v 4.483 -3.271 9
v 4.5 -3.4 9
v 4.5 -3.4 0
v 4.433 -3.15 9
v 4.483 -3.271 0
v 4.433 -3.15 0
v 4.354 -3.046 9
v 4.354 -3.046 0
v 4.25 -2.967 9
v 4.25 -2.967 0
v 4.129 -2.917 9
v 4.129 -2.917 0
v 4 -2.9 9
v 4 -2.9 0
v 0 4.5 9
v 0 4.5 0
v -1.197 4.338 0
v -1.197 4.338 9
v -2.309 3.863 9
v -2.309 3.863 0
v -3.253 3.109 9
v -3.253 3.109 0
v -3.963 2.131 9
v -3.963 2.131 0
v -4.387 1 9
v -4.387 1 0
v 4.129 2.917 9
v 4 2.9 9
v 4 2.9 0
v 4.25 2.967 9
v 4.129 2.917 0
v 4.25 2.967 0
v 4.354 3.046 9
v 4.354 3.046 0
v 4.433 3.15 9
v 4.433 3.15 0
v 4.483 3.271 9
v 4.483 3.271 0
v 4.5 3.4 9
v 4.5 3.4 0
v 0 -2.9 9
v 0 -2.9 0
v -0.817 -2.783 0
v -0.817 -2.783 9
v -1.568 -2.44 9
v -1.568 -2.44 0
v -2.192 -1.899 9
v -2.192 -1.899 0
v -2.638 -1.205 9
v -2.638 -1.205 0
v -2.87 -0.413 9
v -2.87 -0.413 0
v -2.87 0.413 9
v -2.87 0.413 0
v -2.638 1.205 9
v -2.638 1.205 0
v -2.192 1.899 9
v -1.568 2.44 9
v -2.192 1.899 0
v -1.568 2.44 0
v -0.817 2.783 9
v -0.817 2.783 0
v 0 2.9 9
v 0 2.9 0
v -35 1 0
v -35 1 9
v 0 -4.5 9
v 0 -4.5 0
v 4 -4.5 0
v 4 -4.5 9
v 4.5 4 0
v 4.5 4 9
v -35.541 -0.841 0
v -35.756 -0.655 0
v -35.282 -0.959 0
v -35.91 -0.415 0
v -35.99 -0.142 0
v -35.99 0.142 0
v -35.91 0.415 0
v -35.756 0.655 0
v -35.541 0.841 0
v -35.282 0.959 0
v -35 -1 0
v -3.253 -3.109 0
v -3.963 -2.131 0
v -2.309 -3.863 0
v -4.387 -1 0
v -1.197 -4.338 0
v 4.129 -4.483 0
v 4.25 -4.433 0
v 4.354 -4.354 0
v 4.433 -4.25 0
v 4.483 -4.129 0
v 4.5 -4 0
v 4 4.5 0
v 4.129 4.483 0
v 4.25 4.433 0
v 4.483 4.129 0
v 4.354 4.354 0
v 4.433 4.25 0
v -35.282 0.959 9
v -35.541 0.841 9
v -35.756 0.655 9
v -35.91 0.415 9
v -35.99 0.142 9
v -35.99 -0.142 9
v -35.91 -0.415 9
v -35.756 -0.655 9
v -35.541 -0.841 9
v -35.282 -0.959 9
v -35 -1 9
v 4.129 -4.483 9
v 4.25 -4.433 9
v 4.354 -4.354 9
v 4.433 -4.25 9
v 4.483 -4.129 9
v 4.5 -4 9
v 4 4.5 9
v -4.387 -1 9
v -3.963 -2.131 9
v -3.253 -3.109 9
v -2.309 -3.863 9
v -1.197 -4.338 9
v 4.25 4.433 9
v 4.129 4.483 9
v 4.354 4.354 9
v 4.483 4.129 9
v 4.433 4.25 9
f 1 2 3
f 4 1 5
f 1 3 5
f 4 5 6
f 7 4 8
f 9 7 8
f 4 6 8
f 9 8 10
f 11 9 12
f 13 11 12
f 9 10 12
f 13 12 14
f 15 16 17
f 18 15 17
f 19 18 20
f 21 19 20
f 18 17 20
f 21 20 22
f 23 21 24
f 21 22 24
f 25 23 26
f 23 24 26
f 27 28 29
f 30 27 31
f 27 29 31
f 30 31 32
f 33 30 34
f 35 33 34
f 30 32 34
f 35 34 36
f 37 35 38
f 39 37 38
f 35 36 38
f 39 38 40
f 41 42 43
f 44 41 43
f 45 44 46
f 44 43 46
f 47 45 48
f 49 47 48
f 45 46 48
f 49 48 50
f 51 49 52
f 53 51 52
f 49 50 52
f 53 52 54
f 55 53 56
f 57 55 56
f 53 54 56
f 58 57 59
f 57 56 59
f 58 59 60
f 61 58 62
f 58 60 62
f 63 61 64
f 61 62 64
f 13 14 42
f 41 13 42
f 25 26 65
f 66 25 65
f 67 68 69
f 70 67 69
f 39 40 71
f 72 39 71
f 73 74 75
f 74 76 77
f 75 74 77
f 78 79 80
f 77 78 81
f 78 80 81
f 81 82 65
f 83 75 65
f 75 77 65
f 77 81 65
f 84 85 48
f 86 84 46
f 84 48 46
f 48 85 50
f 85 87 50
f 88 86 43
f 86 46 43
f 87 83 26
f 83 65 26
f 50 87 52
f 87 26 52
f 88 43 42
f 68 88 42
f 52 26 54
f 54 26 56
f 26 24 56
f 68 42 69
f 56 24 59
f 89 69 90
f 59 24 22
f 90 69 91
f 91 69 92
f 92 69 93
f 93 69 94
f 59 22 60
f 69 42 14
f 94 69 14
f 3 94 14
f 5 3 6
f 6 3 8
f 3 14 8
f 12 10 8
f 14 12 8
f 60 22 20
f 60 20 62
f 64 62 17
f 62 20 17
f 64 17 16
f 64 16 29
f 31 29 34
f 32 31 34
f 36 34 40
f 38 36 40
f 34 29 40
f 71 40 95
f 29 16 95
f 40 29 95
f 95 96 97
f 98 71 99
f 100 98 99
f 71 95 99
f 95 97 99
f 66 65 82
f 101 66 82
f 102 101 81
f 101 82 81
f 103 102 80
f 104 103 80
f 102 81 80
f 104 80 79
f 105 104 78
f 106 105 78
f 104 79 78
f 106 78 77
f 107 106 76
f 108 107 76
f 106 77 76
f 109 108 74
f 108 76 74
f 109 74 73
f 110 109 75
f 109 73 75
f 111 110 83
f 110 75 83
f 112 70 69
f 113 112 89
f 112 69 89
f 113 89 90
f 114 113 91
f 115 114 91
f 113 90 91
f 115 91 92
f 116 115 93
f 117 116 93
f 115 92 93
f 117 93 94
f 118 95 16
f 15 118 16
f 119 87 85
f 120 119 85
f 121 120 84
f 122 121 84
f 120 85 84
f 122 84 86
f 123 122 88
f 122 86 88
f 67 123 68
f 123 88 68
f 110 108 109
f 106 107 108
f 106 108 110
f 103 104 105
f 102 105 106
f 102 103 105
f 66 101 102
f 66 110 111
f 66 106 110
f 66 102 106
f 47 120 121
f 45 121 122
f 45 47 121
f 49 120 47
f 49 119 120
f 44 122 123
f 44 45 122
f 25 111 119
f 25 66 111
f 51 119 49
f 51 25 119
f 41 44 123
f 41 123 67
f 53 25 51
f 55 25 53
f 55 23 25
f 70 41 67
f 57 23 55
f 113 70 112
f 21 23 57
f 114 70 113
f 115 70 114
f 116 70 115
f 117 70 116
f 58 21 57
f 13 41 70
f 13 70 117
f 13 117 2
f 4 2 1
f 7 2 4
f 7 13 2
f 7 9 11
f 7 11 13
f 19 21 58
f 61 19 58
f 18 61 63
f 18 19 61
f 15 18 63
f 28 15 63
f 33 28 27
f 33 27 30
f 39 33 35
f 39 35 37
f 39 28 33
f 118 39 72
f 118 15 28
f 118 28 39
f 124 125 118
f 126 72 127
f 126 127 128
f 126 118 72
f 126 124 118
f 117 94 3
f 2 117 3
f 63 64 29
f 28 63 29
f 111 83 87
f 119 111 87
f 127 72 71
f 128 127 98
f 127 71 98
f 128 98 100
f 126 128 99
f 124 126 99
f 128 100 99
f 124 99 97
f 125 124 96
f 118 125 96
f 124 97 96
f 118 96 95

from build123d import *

# Parameters (mm, degrees)
F1_DEPTH = 9


with BuildPart() as f1:
    # F0 (on Top) → F1 (new body)
    with BuildSketch(Plane.XY):
        with BuildLine():
            ThreePointArc((0, -2.9), (-2.9, 0), (0, 2.9))
            Line((0, 2.9), (4, 2.9))
            ThreePointArc((4, 2.9), (4.353553, 3.046447), (4.5, 3.4))
            Line((4.5, 3.4), (4.5, 4))
            ThreePointArc((4.5, 4), (4.353553, 4.353553), (4, 4.5))
            Line((4, 4.5), (0, 4.5))
            ThreePointArc((0, 4.5), (-2.806243, 3.517812), (-4.387482, 1))
            Line((-4.387482, 1), (-35, 1))
            ThreePointArc((-35, 1), (-36, 0), (-35, -1))
            Line((-35, -1), (-4.387482, -1))
            ThreePointArc((-4.387482, -1), (-2.806243, -3.517812), (0, -4.5))
            Line((0, -4.5), (4, -4.5))
            ThreePointArc((4, -4.5), (4.353553, -4.353553), (4.5, -4))
            Line((4.5, -4), (4.5, -3.4))
            ThreePointArc((4.5, -3.4), (4.353553, -3.046447), (4, -2.9))
            Line((4, -2.9), (0, -2.9))
        make_face()
    extrude(amount=F1_DEPTH)


solid = f1.part
